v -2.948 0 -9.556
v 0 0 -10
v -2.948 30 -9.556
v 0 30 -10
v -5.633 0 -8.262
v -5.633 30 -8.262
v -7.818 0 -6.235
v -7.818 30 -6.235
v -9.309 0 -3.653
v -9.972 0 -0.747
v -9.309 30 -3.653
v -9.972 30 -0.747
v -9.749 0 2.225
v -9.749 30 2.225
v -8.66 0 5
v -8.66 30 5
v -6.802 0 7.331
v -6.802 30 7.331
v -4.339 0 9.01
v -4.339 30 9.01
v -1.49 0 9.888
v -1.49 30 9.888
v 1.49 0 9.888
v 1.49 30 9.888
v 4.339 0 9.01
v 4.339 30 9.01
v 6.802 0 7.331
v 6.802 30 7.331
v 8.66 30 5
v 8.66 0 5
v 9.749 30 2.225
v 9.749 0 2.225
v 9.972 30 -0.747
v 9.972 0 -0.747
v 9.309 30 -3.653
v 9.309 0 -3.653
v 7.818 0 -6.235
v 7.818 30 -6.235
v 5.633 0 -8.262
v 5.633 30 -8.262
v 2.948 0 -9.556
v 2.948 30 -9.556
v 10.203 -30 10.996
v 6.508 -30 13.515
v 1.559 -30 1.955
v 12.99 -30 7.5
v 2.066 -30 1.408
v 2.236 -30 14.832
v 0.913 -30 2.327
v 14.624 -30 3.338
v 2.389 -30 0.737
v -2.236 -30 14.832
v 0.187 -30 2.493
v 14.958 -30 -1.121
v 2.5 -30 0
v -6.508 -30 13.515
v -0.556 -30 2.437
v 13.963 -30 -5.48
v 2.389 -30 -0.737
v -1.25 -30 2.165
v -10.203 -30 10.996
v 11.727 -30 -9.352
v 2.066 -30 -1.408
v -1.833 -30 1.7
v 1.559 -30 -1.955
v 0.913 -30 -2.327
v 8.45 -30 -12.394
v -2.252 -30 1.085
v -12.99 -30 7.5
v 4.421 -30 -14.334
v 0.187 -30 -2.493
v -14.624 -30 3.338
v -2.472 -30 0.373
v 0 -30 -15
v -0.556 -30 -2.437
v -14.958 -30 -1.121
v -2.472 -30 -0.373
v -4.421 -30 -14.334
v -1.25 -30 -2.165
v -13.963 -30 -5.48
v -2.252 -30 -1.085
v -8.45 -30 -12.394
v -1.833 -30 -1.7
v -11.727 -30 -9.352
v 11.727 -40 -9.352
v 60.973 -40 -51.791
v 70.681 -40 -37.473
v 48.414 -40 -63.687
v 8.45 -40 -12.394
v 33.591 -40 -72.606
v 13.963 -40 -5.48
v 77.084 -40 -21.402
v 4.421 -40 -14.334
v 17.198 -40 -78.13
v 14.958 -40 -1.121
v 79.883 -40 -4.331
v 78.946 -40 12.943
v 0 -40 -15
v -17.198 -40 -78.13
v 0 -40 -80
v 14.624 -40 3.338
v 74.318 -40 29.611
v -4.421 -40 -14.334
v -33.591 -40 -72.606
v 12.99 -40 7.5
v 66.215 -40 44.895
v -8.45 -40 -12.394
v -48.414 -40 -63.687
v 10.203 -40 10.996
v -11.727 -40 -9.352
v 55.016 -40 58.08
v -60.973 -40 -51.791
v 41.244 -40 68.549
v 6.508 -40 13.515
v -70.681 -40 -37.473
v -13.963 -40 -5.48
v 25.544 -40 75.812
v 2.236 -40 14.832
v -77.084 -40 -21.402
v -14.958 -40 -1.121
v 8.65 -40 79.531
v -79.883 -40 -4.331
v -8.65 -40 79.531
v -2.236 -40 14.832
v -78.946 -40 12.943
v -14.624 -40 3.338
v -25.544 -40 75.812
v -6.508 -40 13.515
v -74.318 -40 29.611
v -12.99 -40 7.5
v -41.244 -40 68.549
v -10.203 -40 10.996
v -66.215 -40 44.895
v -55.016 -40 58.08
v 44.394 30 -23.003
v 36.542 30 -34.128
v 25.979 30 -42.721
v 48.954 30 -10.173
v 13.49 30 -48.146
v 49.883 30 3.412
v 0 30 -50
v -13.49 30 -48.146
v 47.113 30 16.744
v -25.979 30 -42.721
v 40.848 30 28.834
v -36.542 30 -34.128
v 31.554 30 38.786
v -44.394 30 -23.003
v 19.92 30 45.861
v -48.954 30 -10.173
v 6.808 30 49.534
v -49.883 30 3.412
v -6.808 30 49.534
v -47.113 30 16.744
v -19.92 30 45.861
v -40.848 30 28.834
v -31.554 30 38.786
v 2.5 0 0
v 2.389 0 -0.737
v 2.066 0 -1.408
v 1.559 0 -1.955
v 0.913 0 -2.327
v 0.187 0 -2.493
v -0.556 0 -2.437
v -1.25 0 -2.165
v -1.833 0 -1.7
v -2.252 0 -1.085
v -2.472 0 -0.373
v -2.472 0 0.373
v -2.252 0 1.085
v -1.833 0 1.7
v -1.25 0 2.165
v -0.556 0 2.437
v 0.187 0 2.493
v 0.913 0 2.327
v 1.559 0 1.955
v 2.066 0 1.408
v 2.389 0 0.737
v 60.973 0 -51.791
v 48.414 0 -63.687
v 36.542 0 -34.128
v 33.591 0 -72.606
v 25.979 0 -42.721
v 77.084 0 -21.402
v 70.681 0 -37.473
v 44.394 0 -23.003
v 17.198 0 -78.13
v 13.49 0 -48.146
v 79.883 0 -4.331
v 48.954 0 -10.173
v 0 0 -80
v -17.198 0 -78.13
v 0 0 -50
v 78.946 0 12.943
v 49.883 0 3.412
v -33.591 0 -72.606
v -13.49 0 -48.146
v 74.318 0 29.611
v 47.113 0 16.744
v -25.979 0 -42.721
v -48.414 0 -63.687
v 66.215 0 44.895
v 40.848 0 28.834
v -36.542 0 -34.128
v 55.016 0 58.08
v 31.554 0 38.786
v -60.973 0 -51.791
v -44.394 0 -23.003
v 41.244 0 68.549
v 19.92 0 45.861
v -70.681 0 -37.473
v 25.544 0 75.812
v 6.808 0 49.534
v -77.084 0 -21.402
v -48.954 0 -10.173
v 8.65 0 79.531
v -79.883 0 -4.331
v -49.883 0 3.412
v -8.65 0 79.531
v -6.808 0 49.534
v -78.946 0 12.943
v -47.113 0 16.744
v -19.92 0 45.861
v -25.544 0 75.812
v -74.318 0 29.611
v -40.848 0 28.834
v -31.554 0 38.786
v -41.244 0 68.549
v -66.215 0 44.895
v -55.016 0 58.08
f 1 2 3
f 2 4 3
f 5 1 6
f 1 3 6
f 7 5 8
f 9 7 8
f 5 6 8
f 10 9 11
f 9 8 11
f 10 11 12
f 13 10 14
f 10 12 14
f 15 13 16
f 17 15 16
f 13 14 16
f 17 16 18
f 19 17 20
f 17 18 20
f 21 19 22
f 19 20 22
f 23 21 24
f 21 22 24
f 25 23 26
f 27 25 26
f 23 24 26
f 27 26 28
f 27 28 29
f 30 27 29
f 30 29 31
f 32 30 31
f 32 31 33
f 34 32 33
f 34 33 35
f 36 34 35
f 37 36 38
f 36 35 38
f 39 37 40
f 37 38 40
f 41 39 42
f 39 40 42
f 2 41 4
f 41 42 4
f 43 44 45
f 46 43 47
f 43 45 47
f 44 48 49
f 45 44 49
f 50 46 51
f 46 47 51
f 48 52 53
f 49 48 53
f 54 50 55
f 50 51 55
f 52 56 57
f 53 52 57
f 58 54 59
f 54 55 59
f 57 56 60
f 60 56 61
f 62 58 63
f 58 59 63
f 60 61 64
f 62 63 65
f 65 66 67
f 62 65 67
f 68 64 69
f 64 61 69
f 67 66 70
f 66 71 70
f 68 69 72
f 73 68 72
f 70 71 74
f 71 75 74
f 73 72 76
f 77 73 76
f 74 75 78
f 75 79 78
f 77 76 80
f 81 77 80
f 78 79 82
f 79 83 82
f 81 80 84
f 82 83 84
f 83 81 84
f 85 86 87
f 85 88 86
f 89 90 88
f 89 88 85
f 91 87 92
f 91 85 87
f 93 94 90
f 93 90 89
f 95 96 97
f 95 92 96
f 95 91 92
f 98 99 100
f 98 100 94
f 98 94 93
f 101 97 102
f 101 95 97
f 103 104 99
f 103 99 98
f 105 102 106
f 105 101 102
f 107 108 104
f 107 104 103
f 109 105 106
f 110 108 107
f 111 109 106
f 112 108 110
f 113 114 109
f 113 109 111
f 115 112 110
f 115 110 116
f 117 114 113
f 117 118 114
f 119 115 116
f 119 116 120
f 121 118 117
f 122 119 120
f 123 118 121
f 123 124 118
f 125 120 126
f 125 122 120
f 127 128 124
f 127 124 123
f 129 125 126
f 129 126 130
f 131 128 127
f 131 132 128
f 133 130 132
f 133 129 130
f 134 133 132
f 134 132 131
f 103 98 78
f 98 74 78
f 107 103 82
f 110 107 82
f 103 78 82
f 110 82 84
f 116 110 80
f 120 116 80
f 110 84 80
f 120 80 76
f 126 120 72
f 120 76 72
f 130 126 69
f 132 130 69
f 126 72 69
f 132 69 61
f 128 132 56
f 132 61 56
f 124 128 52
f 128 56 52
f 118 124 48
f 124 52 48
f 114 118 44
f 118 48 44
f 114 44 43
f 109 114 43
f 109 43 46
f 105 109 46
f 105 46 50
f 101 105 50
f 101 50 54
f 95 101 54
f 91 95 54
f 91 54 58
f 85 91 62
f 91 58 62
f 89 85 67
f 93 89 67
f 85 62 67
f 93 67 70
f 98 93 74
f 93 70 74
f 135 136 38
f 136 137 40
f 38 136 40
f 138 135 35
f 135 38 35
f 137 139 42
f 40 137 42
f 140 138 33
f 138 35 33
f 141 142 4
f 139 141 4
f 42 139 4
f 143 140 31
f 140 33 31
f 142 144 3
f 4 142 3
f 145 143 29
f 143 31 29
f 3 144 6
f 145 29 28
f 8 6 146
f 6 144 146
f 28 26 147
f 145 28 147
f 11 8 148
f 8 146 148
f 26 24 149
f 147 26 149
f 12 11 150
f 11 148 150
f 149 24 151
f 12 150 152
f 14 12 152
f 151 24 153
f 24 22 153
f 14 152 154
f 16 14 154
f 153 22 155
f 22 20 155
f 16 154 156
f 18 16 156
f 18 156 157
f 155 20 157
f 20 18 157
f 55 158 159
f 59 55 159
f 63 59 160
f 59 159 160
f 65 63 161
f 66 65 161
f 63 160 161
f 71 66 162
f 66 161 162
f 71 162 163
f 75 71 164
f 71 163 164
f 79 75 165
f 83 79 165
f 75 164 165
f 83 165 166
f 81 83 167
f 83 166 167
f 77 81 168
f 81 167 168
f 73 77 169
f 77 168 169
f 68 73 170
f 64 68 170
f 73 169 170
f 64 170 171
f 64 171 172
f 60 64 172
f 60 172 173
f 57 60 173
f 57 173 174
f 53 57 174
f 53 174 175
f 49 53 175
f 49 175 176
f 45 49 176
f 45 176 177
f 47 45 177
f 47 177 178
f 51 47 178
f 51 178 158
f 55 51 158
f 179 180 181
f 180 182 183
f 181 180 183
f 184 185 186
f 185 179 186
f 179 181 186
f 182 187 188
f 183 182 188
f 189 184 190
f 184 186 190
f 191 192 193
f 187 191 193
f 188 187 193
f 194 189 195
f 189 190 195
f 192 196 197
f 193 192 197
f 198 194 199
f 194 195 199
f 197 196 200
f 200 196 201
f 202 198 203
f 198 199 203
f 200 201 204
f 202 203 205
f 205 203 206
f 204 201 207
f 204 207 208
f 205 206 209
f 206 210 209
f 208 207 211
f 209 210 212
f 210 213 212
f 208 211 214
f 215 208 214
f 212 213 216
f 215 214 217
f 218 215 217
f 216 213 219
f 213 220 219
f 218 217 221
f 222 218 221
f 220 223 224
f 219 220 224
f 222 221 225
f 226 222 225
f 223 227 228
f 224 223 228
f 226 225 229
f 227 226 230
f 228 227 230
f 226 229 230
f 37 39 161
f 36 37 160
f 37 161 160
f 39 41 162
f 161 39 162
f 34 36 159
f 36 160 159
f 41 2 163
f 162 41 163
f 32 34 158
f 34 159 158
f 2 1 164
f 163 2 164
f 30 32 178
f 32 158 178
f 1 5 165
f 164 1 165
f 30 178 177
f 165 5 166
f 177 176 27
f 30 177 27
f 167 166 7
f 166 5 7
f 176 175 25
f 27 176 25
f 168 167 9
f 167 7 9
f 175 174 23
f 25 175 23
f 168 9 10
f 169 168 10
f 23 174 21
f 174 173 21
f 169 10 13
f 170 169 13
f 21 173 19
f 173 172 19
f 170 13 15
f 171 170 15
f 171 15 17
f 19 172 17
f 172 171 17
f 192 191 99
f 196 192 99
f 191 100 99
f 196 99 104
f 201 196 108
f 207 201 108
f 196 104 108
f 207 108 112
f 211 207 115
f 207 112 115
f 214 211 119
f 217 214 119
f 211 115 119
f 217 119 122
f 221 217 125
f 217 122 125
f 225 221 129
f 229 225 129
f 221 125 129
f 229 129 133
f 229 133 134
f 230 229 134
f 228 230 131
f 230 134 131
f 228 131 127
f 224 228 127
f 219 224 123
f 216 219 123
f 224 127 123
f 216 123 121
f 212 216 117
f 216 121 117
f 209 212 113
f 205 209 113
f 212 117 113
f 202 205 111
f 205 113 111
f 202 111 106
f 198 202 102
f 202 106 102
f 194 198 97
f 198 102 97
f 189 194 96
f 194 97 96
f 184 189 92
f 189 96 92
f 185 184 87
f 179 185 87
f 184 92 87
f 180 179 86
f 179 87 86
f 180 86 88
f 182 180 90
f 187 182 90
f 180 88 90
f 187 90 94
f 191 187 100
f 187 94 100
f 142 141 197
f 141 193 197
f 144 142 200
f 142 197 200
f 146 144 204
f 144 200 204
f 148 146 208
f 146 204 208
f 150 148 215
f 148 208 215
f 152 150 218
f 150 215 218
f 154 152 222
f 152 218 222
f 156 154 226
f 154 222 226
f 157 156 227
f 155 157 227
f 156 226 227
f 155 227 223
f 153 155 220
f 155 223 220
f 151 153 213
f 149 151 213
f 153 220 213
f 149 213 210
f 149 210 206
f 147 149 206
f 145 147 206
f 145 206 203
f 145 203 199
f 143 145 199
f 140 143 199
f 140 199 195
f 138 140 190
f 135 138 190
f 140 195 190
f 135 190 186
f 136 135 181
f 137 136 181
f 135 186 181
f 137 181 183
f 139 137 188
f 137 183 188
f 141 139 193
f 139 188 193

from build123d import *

# Parameters (mm, degrees)
HOLE_WIZARD_M6_2_D = 5


with BuildPart() as part:
    # 草图1 → 旋转1 (revolve)
    with BuildSketch(Plane.XY, mode=Mode.PRIVATE) as revolve_1_sk:
        Polygon((10, 30), (50, 30), (50, 0), (80, 0), (80, -40), (33.191510013, -40), (15, -40), (15, -30), (0, -30), (0, 0), (10, 0), align=None)
    revolve(revolve_1_sk.sketch.rotate(Axis((0, -30, 0), (0, 1, 0)), 90), axis=Axis((0, -30, 0), (0, 1, 0)))

    # M6 螺纹孔2 (through all)
    with Locations(Plane(origin=(0, -30, 0), x_dir=(-1, 0, 0), z_dir=(0, -1, 0))):
        with Locations((0, 0)):
            Hole(HOLE_WIZARD_M6_2_D / 2)


solid = part.part
